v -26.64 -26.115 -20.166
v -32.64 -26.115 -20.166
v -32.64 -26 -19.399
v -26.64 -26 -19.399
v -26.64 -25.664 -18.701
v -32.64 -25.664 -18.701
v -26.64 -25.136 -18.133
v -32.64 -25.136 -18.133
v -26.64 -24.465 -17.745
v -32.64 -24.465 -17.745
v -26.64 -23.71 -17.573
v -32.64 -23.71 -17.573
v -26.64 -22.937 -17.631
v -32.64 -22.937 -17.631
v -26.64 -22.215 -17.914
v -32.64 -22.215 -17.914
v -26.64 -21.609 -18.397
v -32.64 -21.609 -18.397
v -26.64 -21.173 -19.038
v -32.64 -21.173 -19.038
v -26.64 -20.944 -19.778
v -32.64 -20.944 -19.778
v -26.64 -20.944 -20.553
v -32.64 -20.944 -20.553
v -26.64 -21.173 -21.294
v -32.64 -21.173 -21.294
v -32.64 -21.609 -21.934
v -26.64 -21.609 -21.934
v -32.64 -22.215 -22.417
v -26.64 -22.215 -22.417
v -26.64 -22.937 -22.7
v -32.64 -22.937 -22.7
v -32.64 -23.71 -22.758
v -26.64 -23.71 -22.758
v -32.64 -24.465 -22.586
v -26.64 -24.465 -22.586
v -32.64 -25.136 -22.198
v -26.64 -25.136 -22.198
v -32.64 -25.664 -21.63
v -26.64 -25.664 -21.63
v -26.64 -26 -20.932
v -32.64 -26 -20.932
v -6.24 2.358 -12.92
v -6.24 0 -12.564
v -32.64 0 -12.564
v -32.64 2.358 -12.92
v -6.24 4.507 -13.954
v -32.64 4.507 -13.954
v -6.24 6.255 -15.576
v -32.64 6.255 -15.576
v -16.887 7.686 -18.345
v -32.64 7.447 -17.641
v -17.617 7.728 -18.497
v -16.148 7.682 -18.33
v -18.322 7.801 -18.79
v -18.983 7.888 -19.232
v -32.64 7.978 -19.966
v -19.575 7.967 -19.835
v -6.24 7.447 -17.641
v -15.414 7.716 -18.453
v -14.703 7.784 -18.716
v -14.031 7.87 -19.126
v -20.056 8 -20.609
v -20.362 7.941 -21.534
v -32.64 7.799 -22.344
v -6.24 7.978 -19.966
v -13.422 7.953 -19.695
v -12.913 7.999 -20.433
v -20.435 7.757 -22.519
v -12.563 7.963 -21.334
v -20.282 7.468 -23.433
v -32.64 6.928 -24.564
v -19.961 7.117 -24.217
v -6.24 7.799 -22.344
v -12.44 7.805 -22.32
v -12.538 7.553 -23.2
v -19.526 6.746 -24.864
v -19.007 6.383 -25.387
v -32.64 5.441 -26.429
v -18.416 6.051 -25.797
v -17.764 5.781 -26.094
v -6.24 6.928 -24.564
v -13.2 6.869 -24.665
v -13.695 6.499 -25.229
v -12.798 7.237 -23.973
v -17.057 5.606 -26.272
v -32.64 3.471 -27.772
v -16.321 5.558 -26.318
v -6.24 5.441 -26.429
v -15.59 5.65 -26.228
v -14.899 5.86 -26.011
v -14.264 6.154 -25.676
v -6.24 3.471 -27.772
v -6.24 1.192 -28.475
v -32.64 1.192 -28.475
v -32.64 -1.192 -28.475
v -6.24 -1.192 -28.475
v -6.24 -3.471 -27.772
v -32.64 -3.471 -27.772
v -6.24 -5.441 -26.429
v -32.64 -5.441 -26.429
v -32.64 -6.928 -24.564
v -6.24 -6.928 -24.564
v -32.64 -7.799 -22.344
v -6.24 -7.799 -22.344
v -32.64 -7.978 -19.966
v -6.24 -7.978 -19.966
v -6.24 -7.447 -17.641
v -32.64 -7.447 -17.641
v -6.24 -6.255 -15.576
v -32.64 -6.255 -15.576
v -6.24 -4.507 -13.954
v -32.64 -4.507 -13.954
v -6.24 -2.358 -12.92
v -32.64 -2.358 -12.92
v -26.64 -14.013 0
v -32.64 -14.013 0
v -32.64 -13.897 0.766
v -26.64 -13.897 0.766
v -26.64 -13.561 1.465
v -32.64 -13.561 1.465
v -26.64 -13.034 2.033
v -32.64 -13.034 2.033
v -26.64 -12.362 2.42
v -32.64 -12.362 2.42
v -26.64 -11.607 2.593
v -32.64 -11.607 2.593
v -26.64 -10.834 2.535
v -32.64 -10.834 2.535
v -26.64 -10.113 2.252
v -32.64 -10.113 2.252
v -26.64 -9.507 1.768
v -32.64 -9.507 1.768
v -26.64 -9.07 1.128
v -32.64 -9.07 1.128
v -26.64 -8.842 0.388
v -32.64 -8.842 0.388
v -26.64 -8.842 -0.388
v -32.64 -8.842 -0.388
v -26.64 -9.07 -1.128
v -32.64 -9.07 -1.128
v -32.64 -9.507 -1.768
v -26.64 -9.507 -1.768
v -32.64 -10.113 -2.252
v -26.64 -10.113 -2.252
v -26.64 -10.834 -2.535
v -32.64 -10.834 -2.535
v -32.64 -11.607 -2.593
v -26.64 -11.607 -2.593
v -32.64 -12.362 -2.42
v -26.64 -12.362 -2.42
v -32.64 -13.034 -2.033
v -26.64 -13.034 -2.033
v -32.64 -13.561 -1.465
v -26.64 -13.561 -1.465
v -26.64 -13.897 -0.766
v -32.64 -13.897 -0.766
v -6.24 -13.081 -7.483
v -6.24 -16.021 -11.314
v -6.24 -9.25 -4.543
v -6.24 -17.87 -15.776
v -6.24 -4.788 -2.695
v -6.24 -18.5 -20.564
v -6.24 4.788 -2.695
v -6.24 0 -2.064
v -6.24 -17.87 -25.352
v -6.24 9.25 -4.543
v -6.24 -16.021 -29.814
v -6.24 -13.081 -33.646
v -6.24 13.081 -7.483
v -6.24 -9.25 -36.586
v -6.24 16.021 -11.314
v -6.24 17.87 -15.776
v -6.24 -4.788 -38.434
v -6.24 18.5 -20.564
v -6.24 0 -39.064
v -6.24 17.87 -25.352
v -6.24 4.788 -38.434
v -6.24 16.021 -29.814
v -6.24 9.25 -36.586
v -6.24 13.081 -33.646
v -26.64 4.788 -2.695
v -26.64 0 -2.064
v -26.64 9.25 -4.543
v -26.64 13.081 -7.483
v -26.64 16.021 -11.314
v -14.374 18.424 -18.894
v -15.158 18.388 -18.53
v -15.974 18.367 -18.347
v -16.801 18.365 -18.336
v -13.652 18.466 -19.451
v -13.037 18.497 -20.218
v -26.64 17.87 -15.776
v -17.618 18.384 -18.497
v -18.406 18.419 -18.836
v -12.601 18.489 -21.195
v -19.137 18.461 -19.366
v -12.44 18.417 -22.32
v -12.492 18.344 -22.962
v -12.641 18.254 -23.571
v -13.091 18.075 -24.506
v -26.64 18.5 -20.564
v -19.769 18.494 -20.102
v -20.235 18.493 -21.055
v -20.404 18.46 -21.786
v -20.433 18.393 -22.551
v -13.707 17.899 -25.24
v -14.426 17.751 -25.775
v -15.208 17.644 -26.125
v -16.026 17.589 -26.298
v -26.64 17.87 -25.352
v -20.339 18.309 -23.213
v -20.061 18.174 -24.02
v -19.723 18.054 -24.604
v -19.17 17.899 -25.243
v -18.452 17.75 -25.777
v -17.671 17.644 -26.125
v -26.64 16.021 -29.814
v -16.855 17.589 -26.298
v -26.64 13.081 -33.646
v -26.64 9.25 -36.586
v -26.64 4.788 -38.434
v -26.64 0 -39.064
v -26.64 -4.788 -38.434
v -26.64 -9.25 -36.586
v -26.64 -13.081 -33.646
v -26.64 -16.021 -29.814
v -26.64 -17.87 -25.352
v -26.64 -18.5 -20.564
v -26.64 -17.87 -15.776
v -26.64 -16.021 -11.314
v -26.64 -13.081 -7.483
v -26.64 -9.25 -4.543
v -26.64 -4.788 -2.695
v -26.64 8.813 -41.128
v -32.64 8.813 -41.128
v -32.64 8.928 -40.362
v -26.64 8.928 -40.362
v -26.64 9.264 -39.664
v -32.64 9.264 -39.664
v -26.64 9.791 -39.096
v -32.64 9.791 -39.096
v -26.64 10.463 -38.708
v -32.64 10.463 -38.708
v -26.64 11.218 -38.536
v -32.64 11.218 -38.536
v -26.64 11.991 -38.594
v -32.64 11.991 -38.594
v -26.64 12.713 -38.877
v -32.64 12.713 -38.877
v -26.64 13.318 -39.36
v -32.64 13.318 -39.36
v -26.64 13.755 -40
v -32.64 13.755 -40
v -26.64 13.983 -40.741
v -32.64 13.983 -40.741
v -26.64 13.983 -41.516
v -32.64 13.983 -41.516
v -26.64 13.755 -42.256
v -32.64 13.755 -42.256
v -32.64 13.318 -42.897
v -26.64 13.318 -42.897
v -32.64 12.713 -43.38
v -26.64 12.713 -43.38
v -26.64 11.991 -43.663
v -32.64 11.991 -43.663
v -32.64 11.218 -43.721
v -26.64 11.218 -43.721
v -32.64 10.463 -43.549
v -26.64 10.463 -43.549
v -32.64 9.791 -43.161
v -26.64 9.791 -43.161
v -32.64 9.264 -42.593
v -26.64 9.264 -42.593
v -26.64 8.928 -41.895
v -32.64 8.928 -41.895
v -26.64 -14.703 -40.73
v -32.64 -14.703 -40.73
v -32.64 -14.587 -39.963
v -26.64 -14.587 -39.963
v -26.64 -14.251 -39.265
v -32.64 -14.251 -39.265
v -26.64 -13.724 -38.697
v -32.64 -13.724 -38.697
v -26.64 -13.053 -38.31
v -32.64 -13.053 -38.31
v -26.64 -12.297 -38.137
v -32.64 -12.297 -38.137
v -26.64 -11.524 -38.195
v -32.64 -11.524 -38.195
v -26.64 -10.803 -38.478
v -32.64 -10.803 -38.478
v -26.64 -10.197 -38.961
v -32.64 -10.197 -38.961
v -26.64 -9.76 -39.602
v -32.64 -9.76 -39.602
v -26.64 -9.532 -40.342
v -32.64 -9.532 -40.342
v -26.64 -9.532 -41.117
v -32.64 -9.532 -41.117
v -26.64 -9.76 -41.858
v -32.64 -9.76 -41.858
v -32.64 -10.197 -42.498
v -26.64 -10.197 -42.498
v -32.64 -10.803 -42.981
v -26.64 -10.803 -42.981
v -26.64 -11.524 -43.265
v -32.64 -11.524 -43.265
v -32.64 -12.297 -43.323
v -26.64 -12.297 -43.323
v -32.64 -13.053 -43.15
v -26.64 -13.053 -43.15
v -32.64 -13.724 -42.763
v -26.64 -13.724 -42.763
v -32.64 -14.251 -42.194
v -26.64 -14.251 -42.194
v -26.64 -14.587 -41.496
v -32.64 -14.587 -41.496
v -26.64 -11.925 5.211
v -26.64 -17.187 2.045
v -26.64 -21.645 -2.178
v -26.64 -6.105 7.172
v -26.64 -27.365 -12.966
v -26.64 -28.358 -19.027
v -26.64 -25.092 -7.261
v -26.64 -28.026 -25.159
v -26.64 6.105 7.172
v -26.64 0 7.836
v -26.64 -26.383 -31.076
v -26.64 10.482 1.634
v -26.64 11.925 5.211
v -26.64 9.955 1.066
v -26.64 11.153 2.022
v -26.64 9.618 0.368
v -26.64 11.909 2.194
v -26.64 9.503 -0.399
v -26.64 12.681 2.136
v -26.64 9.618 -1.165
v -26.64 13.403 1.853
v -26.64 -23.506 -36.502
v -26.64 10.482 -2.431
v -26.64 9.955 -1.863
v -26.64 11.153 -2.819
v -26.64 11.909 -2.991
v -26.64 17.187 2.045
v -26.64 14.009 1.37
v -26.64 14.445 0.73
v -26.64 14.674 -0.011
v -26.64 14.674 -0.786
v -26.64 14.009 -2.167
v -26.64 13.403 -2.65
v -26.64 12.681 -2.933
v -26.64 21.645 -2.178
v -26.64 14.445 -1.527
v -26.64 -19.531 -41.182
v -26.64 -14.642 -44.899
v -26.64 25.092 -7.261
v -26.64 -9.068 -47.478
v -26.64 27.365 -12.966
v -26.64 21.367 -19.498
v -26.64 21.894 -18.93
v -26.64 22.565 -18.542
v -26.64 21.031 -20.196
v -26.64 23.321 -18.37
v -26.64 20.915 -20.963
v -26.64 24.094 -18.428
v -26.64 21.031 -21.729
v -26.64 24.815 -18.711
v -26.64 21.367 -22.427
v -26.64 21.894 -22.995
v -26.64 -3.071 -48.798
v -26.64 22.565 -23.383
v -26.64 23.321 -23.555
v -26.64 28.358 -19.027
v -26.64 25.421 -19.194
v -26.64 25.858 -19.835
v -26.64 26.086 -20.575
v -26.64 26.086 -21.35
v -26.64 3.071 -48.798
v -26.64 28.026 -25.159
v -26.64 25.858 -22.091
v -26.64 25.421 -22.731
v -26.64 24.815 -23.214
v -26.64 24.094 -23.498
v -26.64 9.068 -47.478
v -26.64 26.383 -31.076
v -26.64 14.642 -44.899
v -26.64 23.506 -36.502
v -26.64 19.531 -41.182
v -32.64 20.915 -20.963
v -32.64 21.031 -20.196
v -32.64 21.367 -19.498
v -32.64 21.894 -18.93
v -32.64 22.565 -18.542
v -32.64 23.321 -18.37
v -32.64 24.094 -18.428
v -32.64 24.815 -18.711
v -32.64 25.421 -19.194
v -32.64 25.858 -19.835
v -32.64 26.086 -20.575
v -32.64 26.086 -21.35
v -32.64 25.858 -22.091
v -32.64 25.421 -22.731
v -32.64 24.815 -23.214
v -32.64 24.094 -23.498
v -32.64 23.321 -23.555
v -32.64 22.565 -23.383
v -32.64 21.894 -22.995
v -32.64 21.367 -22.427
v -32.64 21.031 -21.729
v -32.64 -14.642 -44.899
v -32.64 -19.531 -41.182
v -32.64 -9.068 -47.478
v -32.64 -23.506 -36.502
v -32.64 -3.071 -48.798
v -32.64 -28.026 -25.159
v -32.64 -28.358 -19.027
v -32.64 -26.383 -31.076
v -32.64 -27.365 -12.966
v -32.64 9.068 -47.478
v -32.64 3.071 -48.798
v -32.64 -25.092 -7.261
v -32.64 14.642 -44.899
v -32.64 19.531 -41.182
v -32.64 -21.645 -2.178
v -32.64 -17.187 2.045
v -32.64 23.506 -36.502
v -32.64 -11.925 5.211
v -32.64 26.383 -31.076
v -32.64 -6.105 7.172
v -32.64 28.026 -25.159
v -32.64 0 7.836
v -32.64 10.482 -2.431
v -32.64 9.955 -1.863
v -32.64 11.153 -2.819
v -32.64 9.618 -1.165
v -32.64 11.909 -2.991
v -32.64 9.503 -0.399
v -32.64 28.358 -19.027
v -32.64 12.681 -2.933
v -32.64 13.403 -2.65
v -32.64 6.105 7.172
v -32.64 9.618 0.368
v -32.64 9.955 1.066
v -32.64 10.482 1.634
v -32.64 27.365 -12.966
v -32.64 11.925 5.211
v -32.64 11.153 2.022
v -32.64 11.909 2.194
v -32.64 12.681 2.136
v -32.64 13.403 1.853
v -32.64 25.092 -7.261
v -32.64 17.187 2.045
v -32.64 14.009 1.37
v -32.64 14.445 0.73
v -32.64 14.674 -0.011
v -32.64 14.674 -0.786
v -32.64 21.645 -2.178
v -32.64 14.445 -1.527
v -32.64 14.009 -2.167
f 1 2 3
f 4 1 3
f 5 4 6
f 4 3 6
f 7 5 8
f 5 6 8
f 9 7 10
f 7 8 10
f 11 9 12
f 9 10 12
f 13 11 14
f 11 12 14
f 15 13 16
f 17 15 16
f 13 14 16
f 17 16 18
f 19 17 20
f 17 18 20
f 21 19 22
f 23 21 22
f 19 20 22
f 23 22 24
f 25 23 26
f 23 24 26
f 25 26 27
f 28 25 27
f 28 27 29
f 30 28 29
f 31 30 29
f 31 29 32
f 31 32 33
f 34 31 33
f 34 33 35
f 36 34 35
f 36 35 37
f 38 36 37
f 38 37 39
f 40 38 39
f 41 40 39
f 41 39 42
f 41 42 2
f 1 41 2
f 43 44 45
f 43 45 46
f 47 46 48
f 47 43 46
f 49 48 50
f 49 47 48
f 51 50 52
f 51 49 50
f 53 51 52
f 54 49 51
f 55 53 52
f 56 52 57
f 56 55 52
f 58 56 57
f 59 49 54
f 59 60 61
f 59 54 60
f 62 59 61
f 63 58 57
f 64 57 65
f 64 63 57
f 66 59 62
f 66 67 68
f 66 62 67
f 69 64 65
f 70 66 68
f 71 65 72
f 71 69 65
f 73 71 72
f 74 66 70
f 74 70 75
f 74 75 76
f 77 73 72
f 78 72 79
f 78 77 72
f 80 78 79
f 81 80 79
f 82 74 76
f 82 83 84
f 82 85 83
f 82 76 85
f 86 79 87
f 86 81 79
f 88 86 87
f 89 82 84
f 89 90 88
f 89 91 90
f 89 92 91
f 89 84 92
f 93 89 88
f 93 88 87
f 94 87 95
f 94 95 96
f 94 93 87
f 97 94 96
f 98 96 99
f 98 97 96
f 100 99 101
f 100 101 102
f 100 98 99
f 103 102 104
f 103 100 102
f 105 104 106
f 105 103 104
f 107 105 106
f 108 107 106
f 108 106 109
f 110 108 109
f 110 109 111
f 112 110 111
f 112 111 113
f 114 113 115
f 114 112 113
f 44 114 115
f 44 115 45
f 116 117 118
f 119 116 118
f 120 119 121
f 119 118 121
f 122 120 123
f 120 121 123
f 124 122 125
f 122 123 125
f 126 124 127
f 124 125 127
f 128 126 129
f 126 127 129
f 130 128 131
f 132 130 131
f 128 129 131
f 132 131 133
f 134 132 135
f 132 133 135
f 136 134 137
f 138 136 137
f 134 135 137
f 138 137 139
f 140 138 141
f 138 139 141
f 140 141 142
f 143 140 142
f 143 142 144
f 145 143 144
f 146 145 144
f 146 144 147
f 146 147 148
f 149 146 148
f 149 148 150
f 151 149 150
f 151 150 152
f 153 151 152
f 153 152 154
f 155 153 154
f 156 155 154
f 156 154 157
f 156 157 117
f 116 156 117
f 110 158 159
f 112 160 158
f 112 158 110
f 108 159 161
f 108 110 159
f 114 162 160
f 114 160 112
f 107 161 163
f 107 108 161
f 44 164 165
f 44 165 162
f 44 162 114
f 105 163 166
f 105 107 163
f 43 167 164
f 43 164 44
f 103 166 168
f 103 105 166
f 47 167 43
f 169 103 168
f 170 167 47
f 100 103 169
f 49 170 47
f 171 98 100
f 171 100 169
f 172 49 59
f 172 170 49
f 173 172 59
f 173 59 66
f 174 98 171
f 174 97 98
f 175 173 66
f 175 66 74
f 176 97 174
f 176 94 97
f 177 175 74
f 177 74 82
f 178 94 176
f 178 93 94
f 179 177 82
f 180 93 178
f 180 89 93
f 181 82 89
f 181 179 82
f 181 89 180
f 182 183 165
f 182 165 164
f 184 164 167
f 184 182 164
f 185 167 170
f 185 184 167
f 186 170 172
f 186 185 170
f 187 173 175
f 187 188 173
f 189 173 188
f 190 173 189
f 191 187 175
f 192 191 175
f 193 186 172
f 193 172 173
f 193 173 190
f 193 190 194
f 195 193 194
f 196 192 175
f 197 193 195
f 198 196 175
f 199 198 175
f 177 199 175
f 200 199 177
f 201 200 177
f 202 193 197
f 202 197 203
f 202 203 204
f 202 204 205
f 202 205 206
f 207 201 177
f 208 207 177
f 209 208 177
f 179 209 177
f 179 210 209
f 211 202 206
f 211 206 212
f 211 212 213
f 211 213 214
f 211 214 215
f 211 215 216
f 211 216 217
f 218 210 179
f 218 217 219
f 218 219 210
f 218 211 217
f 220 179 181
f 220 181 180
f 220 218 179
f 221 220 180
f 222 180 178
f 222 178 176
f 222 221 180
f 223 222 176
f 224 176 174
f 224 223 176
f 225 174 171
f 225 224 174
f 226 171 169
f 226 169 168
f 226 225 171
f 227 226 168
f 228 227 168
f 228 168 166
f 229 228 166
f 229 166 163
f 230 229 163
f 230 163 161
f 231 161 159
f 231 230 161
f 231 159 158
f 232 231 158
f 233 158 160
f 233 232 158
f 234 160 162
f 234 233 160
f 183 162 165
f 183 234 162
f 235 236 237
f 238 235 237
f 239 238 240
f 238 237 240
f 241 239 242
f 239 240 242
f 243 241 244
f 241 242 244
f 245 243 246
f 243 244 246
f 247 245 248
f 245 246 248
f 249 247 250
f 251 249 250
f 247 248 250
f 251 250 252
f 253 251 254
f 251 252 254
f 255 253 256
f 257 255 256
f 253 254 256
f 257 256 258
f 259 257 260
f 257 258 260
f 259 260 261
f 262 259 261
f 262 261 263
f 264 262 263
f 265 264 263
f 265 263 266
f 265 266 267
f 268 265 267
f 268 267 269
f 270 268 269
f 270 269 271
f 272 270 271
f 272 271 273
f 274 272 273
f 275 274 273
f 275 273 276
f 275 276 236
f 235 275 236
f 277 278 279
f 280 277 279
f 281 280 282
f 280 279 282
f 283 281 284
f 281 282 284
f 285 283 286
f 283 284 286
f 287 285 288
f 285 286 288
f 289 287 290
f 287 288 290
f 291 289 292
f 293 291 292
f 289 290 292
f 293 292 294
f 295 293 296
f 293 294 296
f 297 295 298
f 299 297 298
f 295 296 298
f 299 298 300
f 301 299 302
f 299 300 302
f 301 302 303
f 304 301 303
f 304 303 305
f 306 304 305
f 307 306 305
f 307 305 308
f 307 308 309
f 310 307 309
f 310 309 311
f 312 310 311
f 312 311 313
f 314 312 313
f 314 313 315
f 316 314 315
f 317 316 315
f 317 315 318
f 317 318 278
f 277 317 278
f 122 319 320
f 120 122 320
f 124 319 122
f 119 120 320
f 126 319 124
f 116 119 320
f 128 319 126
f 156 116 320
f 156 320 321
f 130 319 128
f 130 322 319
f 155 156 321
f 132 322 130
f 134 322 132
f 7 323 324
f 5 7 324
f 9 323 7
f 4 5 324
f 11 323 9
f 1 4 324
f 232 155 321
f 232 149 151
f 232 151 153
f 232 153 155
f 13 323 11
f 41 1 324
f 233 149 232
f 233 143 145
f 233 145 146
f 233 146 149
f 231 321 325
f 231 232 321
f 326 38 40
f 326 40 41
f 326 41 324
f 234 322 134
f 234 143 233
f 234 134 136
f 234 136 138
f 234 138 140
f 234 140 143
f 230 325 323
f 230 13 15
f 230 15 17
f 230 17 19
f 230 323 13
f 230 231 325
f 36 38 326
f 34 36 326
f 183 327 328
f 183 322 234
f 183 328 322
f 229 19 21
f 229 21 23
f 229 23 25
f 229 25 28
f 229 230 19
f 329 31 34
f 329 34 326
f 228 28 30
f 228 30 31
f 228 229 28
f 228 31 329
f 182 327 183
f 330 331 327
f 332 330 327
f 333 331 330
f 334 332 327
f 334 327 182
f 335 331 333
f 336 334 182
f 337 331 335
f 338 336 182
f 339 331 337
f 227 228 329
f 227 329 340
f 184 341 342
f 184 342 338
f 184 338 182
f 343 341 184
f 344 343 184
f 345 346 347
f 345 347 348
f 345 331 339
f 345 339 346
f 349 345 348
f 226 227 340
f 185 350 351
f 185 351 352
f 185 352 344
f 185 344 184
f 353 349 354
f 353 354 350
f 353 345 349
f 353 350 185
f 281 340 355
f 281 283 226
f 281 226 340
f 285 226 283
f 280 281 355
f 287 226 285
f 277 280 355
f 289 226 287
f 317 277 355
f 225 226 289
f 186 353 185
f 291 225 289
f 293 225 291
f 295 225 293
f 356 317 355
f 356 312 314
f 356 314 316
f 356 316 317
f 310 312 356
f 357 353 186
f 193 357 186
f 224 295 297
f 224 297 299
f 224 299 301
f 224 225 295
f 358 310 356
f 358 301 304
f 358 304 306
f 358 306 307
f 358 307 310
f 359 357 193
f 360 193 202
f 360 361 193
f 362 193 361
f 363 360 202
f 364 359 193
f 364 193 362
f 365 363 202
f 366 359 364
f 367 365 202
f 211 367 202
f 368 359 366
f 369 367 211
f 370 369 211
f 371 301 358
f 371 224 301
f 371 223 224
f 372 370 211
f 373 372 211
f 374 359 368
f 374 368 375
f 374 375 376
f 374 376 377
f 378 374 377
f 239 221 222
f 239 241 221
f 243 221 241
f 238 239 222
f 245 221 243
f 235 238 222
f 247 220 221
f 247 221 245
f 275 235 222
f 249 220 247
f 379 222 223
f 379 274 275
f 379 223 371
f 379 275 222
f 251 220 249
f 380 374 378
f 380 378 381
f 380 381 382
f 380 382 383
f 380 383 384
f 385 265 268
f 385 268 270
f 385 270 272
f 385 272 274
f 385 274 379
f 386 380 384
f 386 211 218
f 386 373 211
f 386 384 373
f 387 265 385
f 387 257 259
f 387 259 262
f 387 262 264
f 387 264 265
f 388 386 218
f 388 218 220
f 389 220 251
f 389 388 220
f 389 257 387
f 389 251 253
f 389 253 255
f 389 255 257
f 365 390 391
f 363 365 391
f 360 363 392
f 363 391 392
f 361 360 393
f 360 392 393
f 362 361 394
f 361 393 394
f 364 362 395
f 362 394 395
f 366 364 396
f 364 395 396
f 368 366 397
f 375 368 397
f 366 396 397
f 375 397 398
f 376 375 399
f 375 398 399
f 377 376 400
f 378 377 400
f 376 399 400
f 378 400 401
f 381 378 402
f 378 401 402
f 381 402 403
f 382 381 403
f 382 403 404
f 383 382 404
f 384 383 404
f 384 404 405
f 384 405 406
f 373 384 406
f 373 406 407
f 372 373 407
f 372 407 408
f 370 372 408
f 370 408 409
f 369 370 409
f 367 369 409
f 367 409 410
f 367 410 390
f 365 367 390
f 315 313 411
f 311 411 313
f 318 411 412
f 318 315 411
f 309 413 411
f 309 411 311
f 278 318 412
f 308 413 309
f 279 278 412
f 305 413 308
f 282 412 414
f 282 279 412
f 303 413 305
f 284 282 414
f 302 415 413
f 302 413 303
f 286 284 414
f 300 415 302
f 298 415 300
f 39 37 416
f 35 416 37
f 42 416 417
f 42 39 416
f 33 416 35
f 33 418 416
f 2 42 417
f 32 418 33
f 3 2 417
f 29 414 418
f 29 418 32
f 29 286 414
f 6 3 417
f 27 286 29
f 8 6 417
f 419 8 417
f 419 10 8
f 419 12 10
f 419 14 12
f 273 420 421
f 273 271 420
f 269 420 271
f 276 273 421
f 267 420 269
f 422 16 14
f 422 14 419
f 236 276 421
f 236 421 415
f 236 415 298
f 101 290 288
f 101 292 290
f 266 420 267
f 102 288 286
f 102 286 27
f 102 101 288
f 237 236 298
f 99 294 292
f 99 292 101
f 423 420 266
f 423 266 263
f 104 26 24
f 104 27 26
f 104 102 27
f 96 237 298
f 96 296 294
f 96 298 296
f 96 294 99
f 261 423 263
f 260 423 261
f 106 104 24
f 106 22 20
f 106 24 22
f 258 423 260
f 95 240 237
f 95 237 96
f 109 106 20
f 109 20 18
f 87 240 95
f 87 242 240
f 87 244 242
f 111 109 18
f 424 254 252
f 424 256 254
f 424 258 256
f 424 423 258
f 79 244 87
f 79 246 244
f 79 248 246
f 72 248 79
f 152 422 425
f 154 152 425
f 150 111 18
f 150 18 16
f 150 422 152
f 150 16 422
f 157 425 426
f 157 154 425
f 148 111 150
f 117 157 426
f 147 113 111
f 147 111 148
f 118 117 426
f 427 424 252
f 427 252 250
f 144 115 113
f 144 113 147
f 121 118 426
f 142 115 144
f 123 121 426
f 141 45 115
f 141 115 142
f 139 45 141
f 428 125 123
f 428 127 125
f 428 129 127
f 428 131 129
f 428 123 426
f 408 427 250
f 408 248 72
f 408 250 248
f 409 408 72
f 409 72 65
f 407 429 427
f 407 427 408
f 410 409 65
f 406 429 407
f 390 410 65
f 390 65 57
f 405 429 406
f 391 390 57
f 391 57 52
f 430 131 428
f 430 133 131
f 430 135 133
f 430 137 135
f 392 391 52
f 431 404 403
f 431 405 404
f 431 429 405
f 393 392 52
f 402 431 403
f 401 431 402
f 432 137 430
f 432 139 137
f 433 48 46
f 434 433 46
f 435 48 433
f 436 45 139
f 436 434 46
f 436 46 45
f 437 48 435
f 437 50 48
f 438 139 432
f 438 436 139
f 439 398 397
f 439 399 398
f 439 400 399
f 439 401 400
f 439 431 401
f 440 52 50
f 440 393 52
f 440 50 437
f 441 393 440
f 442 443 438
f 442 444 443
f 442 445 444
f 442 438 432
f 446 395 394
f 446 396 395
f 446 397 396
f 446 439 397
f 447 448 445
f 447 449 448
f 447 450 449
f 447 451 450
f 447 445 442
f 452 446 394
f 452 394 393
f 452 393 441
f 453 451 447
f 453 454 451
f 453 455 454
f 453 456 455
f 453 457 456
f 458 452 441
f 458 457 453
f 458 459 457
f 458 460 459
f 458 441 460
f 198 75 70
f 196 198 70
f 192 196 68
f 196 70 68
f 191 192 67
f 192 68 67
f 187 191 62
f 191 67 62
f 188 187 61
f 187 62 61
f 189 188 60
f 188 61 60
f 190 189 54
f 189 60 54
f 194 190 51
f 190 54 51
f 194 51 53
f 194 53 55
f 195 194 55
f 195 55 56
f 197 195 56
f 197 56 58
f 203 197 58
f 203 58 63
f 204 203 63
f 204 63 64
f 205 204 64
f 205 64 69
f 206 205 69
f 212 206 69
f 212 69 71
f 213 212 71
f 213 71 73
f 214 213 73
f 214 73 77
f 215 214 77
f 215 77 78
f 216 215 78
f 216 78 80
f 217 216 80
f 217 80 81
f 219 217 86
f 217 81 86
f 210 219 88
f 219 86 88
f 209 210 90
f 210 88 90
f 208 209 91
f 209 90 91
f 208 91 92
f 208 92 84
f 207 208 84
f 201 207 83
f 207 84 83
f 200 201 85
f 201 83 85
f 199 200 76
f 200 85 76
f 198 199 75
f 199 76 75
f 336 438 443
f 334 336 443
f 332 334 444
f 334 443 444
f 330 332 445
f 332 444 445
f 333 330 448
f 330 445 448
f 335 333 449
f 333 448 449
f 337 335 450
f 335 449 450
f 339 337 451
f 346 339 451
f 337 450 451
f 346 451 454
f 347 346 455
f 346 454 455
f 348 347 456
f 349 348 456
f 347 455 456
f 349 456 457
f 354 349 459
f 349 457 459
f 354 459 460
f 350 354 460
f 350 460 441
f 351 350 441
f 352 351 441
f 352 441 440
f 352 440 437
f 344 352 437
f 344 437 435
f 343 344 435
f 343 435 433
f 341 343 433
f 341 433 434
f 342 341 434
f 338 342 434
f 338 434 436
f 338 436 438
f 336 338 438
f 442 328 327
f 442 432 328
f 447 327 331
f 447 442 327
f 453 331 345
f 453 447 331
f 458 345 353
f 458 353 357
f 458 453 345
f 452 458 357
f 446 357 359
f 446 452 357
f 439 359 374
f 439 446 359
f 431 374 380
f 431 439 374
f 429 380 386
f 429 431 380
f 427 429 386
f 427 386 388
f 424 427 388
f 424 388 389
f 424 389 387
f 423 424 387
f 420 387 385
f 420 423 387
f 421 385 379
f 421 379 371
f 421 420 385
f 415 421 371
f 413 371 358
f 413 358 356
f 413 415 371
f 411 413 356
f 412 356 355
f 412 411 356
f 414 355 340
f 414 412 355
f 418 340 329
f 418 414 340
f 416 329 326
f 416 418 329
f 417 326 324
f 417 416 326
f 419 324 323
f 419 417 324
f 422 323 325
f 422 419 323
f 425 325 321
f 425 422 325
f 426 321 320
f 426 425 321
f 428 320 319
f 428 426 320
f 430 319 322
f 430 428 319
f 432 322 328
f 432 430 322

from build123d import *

# Parameters (mm, degrees)
F3_D     = 5.2
F5_D     = 8
F5_DEPTH = 28.401


with BuildPart() as f1:
    # F0 (on Front) → F1 (revolve)
    with BuildSketch(Plane.XZ):
        Polygon((-32.6399943951, 7.8358277731), (-32.6399943951, -12.5641722269), (-6.2399943951, -12.5641722269), (-6.2399943951, -2.0641722269), (-26.6399943951, -2.0641722269), (-26.6399943951, 7.8358277731), align=None)
    revolve(axis=Axis((0, 0, -20.5641722269), (-1, 0, 0)))

    # F3 (through all)
    with Locations(Plane.YZ.offset(-26.6399943951)):
        with Locations((-11.4125286283, 0), (12.1028312422, -0.3985464), (23.5153598705, -20.9627186269), (11.4125286283, -41.1283444539), (-12.1028312422, -40.7297980539), (-23.5153598705, -20.165625827)):
            Hole(F3_D / 2)

    # F5 (through all, one way)
    with BuildSketch(Plane.XZ):
        with Locations((-16.4399943951, -22.3195198923)):
            Circle(F5_D / 2)
    extrude(amount=-F5_DEPTH, mode=Mode.SUBTRACT)


solid = f1.part
